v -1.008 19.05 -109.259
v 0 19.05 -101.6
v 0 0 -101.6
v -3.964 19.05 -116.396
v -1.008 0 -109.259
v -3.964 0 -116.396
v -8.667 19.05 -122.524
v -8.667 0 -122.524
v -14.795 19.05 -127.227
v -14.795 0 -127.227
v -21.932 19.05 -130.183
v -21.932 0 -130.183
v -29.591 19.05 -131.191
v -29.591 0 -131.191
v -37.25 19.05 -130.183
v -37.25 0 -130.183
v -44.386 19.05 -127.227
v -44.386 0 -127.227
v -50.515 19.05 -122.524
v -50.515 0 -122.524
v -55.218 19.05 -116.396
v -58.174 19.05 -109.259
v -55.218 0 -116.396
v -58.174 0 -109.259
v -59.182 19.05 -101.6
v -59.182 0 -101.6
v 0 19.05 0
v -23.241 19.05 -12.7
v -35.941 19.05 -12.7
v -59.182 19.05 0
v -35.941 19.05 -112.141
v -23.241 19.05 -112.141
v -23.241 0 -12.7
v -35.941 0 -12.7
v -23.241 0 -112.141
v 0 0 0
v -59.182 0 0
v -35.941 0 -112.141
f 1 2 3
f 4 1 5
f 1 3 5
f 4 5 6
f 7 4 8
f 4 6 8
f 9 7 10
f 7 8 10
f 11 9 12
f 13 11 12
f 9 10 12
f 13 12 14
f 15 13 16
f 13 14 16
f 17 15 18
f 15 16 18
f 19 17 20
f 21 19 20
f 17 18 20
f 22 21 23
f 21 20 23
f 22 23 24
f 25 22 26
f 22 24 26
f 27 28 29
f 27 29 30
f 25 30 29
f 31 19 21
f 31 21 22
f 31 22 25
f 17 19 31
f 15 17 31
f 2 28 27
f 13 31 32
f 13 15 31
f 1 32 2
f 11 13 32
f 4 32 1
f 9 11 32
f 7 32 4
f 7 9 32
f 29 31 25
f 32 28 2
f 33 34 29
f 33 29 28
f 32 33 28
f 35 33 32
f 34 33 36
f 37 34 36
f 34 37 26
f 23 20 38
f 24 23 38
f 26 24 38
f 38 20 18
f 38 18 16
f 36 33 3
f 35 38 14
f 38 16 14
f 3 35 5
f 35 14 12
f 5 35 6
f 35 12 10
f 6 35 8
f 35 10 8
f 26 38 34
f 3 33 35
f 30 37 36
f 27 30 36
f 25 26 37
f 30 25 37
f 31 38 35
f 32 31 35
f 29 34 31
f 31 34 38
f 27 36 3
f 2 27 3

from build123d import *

# Parameters (mm, degrees)
SKETCH1_W           = 12.7
SKETCH1_H           = 99.441
BOSS_EXTRUDE1_DEPTH = 19.05


with BuildPart() as part:
    # Sketch1 → Boss-Extrude1 (new body)
    with BuildSketch(Plane(origin=(0, 0, 0), x_dir=(1, 0, 0), z_dir=(0, 1, 0))):
        with BuildLine():
            Line((-59.182, 0), (0, 0))
            Line((0, 0), (0, 101.6))
            ThreePointArc((0, 101.6), (-29.591, 131.191), (-59.182, 101.6))
            Line((-59.182, 101.6), (-59.182, 0))
        make_face()
        with Locations((-29.591, 62.4205)):
            Rectangle(SKETCH1_W, SKETCH1_H, mode=Mode.SUBTRACT)
    extrude(amount=BOSS_EXTRUDE1_DEPTH)


solid = part.part
